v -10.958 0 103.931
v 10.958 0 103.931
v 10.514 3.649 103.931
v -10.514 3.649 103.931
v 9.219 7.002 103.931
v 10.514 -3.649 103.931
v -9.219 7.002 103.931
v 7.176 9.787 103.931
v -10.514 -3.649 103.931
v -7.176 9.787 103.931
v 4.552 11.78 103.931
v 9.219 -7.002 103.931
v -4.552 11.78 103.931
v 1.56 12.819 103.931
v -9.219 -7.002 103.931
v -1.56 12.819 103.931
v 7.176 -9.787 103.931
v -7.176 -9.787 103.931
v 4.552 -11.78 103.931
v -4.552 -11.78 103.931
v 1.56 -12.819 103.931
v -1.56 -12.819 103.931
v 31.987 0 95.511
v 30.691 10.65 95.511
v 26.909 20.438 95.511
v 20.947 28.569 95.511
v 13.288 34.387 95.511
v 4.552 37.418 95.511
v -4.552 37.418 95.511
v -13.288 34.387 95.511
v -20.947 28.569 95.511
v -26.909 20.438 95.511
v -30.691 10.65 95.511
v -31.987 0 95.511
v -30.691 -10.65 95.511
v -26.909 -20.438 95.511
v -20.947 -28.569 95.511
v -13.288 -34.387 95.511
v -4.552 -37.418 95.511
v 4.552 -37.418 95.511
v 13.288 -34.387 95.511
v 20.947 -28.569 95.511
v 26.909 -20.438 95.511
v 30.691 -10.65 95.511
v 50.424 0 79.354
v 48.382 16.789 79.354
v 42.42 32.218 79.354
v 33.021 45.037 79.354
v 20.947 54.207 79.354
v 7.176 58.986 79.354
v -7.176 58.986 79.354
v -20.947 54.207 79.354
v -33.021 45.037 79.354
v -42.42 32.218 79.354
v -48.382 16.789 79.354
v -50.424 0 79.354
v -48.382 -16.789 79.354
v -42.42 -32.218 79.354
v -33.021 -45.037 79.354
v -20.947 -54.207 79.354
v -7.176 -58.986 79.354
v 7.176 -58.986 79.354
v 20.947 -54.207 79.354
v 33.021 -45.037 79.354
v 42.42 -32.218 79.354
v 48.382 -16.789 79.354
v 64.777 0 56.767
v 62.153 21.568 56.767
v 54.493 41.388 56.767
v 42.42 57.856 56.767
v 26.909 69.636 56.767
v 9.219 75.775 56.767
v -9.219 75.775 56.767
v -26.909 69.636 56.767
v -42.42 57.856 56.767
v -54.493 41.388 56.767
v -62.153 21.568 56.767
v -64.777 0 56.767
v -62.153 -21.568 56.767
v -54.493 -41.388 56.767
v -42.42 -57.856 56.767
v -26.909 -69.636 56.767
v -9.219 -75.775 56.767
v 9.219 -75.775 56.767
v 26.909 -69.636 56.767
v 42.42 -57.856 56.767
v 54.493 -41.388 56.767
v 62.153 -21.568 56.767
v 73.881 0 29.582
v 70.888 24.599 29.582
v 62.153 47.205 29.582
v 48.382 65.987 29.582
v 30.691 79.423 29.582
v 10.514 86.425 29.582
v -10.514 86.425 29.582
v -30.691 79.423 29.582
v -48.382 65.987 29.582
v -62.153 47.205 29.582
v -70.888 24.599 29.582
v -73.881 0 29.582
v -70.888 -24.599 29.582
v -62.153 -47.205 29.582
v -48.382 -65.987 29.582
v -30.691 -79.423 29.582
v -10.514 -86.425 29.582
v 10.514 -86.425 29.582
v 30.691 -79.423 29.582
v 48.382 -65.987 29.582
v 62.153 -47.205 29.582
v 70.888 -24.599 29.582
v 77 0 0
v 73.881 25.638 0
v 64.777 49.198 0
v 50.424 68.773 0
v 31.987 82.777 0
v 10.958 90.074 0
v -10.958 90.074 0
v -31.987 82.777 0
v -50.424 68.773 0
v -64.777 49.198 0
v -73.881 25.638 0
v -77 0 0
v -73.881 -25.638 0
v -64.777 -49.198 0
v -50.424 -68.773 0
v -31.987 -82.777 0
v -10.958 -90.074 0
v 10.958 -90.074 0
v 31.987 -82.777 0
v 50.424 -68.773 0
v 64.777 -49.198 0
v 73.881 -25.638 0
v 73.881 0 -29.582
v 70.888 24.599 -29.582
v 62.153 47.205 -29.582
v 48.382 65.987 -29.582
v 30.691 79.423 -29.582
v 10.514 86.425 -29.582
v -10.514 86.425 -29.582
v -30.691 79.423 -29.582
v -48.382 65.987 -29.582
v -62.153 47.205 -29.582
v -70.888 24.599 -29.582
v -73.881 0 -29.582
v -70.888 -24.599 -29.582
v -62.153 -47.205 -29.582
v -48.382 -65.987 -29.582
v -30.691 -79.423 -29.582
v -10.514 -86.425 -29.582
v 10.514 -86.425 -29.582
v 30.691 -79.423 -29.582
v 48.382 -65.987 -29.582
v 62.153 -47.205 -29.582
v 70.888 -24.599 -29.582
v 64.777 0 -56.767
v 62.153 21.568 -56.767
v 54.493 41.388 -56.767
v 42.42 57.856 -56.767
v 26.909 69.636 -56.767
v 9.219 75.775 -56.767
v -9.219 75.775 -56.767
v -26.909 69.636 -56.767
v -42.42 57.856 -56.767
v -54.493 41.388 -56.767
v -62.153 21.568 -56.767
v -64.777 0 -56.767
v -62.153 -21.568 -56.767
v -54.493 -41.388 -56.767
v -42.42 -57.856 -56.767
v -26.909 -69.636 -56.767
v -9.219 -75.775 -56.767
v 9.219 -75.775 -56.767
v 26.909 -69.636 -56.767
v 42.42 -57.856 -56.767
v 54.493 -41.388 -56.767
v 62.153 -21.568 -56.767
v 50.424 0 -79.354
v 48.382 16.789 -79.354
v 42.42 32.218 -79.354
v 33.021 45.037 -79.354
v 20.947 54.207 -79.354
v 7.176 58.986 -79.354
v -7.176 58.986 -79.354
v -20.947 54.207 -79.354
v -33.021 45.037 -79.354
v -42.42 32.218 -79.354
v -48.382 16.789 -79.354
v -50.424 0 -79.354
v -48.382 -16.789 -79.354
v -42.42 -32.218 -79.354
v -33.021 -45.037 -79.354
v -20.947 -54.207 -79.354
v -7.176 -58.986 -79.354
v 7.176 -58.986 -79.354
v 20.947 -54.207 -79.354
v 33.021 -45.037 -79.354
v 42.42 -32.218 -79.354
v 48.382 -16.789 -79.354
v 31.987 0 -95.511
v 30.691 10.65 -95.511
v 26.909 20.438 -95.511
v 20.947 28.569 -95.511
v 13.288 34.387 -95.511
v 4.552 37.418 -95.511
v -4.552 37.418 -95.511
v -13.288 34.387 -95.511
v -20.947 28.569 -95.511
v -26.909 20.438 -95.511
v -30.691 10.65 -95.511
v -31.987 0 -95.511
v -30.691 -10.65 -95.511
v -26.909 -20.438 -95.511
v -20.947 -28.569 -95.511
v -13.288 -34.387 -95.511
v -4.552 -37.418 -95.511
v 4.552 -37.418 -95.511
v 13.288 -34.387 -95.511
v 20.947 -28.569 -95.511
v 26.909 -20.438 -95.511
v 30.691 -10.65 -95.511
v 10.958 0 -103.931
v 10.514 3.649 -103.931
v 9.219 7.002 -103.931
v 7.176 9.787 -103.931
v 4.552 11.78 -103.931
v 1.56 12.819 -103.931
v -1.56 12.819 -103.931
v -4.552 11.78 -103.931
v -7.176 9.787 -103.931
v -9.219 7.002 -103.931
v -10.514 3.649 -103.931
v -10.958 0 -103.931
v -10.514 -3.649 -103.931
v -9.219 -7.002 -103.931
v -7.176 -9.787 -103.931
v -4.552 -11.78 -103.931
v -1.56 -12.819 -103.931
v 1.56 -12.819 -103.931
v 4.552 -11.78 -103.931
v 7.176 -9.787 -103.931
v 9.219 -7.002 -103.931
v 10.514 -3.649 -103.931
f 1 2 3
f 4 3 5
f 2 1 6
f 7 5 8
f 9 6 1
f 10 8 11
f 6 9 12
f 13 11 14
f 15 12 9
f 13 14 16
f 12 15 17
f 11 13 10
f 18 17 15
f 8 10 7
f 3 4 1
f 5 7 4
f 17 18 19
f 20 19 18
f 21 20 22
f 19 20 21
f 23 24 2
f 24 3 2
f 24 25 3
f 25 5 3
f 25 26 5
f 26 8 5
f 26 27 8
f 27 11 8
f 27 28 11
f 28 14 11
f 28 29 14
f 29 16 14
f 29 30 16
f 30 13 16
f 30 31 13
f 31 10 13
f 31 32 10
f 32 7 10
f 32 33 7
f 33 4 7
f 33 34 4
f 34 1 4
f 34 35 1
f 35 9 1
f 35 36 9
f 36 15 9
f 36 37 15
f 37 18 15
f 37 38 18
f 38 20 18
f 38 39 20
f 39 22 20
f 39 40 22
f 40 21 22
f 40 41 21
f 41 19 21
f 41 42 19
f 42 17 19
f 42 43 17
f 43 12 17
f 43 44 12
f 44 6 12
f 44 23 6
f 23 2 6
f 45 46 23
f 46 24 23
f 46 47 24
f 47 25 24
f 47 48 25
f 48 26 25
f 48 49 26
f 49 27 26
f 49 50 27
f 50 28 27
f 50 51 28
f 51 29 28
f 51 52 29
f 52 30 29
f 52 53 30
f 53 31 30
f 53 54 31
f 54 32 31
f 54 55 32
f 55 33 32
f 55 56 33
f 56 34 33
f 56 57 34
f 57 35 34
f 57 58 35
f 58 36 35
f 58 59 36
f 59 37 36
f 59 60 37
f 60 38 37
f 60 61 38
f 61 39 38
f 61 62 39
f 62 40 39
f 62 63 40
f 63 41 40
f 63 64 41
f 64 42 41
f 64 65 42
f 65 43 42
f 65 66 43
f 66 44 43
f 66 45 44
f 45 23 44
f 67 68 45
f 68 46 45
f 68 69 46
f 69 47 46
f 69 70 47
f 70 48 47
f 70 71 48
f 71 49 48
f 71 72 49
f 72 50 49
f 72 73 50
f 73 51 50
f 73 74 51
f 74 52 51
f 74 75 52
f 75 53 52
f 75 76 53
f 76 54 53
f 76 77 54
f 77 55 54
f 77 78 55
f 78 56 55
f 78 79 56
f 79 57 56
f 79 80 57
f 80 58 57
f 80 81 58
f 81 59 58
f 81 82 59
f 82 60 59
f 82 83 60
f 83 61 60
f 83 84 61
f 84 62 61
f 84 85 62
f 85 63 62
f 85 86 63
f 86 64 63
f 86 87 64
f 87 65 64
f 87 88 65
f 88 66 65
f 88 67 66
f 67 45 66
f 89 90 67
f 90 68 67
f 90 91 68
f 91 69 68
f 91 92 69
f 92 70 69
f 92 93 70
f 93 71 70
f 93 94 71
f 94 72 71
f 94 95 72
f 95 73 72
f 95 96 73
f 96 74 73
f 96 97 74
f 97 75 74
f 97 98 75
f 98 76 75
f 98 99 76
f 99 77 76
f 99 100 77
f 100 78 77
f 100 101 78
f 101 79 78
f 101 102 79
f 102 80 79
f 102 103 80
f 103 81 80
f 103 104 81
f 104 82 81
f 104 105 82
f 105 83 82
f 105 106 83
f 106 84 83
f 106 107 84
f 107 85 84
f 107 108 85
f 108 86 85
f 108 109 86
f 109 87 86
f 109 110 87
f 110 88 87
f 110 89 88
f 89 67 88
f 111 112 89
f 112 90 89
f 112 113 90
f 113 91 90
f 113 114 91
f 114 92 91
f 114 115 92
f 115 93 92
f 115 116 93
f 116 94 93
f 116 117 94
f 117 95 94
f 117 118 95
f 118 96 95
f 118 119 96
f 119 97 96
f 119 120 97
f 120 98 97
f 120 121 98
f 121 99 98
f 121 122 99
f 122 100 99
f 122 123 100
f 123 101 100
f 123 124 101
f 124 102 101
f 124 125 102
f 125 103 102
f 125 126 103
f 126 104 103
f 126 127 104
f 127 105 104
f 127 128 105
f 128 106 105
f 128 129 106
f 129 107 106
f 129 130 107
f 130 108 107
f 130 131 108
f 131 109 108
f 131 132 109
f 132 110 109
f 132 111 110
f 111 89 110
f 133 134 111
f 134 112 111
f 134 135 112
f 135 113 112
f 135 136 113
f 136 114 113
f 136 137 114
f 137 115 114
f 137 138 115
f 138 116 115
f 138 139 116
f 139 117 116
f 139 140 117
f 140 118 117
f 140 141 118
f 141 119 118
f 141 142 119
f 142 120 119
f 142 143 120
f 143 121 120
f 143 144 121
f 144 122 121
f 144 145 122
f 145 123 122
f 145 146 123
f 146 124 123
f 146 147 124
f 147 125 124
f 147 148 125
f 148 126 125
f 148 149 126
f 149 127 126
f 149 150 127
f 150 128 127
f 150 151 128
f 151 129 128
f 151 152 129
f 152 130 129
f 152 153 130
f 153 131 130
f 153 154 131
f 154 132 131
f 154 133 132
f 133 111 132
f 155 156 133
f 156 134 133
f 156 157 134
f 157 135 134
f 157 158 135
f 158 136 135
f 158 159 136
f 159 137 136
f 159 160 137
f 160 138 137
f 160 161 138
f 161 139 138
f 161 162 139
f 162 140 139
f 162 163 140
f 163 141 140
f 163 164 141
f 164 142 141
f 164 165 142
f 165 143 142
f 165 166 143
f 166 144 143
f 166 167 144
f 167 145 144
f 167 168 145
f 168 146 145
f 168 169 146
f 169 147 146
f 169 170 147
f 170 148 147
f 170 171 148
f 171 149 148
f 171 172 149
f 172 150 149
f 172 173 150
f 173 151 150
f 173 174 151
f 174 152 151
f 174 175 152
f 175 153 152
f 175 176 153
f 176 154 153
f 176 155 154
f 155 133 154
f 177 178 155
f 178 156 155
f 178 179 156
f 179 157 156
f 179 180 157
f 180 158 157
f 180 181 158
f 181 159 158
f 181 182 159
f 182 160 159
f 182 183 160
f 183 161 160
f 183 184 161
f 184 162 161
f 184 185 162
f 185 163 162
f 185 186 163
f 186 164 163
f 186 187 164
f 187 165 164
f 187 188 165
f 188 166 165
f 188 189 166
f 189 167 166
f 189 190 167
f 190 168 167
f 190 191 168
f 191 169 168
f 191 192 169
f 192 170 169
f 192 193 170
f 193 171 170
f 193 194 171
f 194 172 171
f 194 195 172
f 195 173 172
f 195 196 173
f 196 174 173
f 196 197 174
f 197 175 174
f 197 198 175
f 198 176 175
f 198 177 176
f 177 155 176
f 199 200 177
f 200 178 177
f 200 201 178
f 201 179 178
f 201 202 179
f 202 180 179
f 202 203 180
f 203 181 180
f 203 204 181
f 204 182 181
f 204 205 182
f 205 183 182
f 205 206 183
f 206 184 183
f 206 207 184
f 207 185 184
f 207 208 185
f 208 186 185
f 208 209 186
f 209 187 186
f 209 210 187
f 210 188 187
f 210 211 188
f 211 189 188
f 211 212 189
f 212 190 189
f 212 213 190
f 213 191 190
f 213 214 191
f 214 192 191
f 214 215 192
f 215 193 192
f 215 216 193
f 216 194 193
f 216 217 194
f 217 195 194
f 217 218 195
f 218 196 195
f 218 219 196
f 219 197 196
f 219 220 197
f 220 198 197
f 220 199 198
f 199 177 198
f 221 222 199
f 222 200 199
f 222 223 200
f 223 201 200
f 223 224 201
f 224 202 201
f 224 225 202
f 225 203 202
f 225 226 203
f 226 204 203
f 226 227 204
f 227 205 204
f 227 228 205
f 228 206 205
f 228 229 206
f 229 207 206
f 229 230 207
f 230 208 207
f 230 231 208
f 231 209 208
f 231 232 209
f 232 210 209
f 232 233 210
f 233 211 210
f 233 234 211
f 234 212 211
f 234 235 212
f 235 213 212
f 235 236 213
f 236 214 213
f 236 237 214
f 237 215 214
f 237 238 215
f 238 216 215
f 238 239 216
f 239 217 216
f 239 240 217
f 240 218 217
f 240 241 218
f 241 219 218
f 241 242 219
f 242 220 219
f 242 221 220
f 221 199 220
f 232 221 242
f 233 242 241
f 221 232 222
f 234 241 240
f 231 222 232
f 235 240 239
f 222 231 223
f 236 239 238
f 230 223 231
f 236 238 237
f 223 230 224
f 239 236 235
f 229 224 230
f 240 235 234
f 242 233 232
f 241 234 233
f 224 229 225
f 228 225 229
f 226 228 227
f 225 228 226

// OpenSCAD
// Generated by SolidPython 1.0.1 on 2020-07-29 00:46:49


scale(v = [11, 13, 15]) {
	sphere(r = 7);
}
/***********************************************
*********      SolidPython code:      **********
************************************************
 
# import packages: SolidPython
from solid import *
from solid.utils import *
from itertools import chain, combinations, permutations


class Resize:

    def __init__(self, scad_file):
        self.scad_file = scad_file
        #self.scad_file = import_scad(scad_file)
        # cone/cylinder param:
        self.r1 = 0
        self.r2 = 0
        self.h = 0
        # rectangular prism param:
        self.w = 0
        self.l = 0
        # ellipse param:
        self.r = 0

    # import OpenScad code (file name corresponds to shape)


    # classify shape + parameters
    def assign(self, param1, param2, param3):
        if self.scad_file == 'cone.scad':
            self.r1 = param1
            self.r2 = param2
            self.h = param3
        elif self.scad_file == 'cylinder.scad':
            self.r1 = param1
            self.r2 = param2
            self.h = param3
        elif self.scad_file == 'rectangularPrism.scad':
            self.h = param1
            self.l = param2
            self.w = param3
        else:
            self.r = param1
            self.h = param2

    # resize parameters
    def iterate(self):
        x = range(3, 20, 2)
        i = 1
        if self.scad_file == 'cone.scad':
            tempList = list(permutations(x, 2))
            for temp in tempList:
                param1 = temp[0]
                param2 = temp[1]
                filepath = 'produced_scad_files/' + 'cone' + str(param1) + '_' + str(param2) + '_' + '.scad'
                scad_render_to_file(cylinder(h=param1, r1=param2, r2=0), filepath)

        elif self.scad_file == 'cylinder.scad':
            tempList = list(permutations(x, 3))
            for temp in tempList:
                param1 = temp[0]
                param2 = temp[1]
                filepath = 'produced_scad_files/' + 'cylinder' + str(param1) + '_' + str(param2) + '_' + '.scad'
                scad_render_to_file(cylinder(h=param1, r1=param2, r2=param2), filepath)

        elif self.scad_file == 'rectangularPrism.scad':
            tempList = list(permutations(x, 3))
            for temp in tempList:
                param1 = temp[0]
                param2 = temp[1]
                param3 = temp[2]
                filepath = 'produced_scad_files/' + 'rectangularPrism' + str(param1) + '_' + str(param2) + '_' + str(
                    param3) + '.scad'
                scad_render_to_file(cube(size=(param1, param2, param3)), filepath)

        elif self.scad_file == 'ellipse.scad':
            tempList = list(permutations(x, 4))
            for temp in tempList:
                param1 = temp[0]
                param2 = temp[1]
                param3 = temp[2]
                param4 = temp[3]
                filepath = 'produced_scad_files/' + 'ellipse' + str(param1) + '_' + str(param2) + '_' + str(param3) + '_' + str(param4) + '.scad'
                scad_render_to_file(scale([param1, param2, param3])(sphere(r=param4)), filepath)

    def render_to_scadfile(self):
        scad_render_to_file(scad, 'example.scad') 
 
************************************************/
